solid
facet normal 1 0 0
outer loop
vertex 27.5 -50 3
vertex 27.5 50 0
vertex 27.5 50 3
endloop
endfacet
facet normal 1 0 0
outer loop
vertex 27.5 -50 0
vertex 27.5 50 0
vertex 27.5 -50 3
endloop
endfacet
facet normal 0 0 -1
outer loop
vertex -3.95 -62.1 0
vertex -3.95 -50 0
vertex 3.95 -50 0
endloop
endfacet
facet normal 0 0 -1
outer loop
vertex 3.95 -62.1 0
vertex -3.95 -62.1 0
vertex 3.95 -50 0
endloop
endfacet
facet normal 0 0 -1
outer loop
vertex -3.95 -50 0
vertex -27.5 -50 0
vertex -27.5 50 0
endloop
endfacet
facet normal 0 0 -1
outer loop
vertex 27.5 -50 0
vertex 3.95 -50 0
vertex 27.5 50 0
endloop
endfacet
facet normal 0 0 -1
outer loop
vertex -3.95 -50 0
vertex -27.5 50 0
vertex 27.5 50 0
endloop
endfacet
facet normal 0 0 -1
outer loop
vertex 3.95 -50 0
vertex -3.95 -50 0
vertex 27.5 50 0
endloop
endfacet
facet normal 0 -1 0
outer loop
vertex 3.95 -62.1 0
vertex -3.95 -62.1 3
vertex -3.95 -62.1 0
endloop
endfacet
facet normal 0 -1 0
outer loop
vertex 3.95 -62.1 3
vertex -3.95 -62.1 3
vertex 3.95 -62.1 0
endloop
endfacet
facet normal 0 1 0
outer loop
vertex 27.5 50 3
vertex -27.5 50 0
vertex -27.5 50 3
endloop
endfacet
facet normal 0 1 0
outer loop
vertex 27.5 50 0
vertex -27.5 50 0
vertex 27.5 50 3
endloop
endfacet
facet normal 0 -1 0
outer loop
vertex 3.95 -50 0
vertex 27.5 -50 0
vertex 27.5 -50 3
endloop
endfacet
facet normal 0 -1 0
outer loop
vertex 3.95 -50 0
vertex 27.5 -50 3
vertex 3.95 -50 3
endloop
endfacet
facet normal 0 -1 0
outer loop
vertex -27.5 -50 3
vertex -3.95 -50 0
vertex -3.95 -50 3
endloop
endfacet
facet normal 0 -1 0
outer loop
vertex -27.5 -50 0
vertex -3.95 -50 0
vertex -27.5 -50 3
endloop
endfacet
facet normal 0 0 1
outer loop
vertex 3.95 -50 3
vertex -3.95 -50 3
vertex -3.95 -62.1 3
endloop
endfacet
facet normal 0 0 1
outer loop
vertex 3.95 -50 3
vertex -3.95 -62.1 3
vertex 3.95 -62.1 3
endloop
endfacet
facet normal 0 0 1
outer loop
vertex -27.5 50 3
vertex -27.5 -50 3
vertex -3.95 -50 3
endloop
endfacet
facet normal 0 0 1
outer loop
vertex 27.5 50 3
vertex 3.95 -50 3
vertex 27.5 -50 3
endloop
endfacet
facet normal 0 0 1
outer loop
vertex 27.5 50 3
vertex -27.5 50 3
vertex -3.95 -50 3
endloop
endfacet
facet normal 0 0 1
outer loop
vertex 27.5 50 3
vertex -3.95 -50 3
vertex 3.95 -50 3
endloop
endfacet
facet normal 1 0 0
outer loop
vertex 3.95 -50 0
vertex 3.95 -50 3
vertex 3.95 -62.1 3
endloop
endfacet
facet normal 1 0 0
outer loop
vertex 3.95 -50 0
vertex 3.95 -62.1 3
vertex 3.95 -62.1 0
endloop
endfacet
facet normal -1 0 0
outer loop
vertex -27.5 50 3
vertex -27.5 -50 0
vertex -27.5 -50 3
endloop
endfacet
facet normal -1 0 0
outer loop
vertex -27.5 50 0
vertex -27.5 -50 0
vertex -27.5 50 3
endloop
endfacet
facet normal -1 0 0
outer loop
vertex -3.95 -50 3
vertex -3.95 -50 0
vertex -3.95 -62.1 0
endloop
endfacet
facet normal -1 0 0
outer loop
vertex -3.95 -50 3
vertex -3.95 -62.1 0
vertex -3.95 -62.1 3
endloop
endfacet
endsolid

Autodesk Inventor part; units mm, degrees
ref_plane "YZ Plane" through (0, 0, 0) normal (1, 0, 0) x (0, 1, 0)
ref_plane "XZ Plane" through (0, 0, 0) normal (0, 1, 0) x (-1, 0, 0)
ref_plane "XY Plane" through (0, 0, 0) normal (0, 0, 1) x (1, 0, 0)
sketch "Sketch1" plane through (0, 0, 0) normal (0, 0, 1) x (1, 0, 0)
  line L0 (-27.5, 50) -> (27.5, 50)
  line L1 (27.5, 50) -> (27.5, -50)
  line L2 (27.5, -50) -> (-27.5, -50)
  line L3 (-27.5, -50) -> (-27.5, 50)
  point P0 (0, 0)
  point P1 (0, 50)
  dimension "d0" = 50
  dimension "d2" = 100
  dimension "d3" = 55
  dimension "d4" = 27.5
extrude "Extrusion1" add sketch "Sketch1" along normal blind 3
sketch "Sketch2" plane through (-27.5, -50, 0) normal (0, -1, 0) x (1, 0, 0)
  line L0 (31.45, 0) -> (23.55, 0)
  line L1 (23.55, 0) -> (23.55, 3)
  line L2 (23.55, 3) -> (31.45, 3)
  line L3 (31.45, 3) -> (31.45, 0)
  line L4 (31.45, 0) -> (23.55, 3) construction
  line L5 (23.55, 0) -> (31.45, 3) construction
  line L6 (0, 0) -> (55, 0) projected
  line L7 (0, 3) -> (55, 3) projected
  line L8 (55, 0) -> (55, 3) projected
  line L9 (0, 0) -> (0, 3) projected
  point P0 (27.5, 0)
  point P1 (27.5, 1.5)
  point P2 (55, 1.5)
  point P3 (31.45, 1.5)
  point P4 (0, 1.5)
  point P5 (27.5, 0)
  dimension "d8" = 7.9
extrude "Extrusion2" add sketch "Sketch2" along normal blind 12.1 contours L0 L1 L2 L3
properties part number "AcrylicPane"
